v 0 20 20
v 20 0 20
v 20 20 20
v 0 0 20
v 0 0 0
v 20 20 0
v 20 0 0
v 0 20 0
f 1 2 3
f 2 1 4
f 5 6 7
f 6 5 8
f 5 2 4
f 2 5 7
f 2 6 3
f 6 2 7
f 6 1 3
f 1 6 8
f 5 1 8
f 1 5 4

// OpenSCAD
// Baseline for red-region edit cases: a 20×20×20 mm box.
// The edit is module-scoped — everything not marked in red is preserved.
W = 20;
H = 20;
D = 20;

module base_box() {
  cube([W, H, D]);
}

base_box();
